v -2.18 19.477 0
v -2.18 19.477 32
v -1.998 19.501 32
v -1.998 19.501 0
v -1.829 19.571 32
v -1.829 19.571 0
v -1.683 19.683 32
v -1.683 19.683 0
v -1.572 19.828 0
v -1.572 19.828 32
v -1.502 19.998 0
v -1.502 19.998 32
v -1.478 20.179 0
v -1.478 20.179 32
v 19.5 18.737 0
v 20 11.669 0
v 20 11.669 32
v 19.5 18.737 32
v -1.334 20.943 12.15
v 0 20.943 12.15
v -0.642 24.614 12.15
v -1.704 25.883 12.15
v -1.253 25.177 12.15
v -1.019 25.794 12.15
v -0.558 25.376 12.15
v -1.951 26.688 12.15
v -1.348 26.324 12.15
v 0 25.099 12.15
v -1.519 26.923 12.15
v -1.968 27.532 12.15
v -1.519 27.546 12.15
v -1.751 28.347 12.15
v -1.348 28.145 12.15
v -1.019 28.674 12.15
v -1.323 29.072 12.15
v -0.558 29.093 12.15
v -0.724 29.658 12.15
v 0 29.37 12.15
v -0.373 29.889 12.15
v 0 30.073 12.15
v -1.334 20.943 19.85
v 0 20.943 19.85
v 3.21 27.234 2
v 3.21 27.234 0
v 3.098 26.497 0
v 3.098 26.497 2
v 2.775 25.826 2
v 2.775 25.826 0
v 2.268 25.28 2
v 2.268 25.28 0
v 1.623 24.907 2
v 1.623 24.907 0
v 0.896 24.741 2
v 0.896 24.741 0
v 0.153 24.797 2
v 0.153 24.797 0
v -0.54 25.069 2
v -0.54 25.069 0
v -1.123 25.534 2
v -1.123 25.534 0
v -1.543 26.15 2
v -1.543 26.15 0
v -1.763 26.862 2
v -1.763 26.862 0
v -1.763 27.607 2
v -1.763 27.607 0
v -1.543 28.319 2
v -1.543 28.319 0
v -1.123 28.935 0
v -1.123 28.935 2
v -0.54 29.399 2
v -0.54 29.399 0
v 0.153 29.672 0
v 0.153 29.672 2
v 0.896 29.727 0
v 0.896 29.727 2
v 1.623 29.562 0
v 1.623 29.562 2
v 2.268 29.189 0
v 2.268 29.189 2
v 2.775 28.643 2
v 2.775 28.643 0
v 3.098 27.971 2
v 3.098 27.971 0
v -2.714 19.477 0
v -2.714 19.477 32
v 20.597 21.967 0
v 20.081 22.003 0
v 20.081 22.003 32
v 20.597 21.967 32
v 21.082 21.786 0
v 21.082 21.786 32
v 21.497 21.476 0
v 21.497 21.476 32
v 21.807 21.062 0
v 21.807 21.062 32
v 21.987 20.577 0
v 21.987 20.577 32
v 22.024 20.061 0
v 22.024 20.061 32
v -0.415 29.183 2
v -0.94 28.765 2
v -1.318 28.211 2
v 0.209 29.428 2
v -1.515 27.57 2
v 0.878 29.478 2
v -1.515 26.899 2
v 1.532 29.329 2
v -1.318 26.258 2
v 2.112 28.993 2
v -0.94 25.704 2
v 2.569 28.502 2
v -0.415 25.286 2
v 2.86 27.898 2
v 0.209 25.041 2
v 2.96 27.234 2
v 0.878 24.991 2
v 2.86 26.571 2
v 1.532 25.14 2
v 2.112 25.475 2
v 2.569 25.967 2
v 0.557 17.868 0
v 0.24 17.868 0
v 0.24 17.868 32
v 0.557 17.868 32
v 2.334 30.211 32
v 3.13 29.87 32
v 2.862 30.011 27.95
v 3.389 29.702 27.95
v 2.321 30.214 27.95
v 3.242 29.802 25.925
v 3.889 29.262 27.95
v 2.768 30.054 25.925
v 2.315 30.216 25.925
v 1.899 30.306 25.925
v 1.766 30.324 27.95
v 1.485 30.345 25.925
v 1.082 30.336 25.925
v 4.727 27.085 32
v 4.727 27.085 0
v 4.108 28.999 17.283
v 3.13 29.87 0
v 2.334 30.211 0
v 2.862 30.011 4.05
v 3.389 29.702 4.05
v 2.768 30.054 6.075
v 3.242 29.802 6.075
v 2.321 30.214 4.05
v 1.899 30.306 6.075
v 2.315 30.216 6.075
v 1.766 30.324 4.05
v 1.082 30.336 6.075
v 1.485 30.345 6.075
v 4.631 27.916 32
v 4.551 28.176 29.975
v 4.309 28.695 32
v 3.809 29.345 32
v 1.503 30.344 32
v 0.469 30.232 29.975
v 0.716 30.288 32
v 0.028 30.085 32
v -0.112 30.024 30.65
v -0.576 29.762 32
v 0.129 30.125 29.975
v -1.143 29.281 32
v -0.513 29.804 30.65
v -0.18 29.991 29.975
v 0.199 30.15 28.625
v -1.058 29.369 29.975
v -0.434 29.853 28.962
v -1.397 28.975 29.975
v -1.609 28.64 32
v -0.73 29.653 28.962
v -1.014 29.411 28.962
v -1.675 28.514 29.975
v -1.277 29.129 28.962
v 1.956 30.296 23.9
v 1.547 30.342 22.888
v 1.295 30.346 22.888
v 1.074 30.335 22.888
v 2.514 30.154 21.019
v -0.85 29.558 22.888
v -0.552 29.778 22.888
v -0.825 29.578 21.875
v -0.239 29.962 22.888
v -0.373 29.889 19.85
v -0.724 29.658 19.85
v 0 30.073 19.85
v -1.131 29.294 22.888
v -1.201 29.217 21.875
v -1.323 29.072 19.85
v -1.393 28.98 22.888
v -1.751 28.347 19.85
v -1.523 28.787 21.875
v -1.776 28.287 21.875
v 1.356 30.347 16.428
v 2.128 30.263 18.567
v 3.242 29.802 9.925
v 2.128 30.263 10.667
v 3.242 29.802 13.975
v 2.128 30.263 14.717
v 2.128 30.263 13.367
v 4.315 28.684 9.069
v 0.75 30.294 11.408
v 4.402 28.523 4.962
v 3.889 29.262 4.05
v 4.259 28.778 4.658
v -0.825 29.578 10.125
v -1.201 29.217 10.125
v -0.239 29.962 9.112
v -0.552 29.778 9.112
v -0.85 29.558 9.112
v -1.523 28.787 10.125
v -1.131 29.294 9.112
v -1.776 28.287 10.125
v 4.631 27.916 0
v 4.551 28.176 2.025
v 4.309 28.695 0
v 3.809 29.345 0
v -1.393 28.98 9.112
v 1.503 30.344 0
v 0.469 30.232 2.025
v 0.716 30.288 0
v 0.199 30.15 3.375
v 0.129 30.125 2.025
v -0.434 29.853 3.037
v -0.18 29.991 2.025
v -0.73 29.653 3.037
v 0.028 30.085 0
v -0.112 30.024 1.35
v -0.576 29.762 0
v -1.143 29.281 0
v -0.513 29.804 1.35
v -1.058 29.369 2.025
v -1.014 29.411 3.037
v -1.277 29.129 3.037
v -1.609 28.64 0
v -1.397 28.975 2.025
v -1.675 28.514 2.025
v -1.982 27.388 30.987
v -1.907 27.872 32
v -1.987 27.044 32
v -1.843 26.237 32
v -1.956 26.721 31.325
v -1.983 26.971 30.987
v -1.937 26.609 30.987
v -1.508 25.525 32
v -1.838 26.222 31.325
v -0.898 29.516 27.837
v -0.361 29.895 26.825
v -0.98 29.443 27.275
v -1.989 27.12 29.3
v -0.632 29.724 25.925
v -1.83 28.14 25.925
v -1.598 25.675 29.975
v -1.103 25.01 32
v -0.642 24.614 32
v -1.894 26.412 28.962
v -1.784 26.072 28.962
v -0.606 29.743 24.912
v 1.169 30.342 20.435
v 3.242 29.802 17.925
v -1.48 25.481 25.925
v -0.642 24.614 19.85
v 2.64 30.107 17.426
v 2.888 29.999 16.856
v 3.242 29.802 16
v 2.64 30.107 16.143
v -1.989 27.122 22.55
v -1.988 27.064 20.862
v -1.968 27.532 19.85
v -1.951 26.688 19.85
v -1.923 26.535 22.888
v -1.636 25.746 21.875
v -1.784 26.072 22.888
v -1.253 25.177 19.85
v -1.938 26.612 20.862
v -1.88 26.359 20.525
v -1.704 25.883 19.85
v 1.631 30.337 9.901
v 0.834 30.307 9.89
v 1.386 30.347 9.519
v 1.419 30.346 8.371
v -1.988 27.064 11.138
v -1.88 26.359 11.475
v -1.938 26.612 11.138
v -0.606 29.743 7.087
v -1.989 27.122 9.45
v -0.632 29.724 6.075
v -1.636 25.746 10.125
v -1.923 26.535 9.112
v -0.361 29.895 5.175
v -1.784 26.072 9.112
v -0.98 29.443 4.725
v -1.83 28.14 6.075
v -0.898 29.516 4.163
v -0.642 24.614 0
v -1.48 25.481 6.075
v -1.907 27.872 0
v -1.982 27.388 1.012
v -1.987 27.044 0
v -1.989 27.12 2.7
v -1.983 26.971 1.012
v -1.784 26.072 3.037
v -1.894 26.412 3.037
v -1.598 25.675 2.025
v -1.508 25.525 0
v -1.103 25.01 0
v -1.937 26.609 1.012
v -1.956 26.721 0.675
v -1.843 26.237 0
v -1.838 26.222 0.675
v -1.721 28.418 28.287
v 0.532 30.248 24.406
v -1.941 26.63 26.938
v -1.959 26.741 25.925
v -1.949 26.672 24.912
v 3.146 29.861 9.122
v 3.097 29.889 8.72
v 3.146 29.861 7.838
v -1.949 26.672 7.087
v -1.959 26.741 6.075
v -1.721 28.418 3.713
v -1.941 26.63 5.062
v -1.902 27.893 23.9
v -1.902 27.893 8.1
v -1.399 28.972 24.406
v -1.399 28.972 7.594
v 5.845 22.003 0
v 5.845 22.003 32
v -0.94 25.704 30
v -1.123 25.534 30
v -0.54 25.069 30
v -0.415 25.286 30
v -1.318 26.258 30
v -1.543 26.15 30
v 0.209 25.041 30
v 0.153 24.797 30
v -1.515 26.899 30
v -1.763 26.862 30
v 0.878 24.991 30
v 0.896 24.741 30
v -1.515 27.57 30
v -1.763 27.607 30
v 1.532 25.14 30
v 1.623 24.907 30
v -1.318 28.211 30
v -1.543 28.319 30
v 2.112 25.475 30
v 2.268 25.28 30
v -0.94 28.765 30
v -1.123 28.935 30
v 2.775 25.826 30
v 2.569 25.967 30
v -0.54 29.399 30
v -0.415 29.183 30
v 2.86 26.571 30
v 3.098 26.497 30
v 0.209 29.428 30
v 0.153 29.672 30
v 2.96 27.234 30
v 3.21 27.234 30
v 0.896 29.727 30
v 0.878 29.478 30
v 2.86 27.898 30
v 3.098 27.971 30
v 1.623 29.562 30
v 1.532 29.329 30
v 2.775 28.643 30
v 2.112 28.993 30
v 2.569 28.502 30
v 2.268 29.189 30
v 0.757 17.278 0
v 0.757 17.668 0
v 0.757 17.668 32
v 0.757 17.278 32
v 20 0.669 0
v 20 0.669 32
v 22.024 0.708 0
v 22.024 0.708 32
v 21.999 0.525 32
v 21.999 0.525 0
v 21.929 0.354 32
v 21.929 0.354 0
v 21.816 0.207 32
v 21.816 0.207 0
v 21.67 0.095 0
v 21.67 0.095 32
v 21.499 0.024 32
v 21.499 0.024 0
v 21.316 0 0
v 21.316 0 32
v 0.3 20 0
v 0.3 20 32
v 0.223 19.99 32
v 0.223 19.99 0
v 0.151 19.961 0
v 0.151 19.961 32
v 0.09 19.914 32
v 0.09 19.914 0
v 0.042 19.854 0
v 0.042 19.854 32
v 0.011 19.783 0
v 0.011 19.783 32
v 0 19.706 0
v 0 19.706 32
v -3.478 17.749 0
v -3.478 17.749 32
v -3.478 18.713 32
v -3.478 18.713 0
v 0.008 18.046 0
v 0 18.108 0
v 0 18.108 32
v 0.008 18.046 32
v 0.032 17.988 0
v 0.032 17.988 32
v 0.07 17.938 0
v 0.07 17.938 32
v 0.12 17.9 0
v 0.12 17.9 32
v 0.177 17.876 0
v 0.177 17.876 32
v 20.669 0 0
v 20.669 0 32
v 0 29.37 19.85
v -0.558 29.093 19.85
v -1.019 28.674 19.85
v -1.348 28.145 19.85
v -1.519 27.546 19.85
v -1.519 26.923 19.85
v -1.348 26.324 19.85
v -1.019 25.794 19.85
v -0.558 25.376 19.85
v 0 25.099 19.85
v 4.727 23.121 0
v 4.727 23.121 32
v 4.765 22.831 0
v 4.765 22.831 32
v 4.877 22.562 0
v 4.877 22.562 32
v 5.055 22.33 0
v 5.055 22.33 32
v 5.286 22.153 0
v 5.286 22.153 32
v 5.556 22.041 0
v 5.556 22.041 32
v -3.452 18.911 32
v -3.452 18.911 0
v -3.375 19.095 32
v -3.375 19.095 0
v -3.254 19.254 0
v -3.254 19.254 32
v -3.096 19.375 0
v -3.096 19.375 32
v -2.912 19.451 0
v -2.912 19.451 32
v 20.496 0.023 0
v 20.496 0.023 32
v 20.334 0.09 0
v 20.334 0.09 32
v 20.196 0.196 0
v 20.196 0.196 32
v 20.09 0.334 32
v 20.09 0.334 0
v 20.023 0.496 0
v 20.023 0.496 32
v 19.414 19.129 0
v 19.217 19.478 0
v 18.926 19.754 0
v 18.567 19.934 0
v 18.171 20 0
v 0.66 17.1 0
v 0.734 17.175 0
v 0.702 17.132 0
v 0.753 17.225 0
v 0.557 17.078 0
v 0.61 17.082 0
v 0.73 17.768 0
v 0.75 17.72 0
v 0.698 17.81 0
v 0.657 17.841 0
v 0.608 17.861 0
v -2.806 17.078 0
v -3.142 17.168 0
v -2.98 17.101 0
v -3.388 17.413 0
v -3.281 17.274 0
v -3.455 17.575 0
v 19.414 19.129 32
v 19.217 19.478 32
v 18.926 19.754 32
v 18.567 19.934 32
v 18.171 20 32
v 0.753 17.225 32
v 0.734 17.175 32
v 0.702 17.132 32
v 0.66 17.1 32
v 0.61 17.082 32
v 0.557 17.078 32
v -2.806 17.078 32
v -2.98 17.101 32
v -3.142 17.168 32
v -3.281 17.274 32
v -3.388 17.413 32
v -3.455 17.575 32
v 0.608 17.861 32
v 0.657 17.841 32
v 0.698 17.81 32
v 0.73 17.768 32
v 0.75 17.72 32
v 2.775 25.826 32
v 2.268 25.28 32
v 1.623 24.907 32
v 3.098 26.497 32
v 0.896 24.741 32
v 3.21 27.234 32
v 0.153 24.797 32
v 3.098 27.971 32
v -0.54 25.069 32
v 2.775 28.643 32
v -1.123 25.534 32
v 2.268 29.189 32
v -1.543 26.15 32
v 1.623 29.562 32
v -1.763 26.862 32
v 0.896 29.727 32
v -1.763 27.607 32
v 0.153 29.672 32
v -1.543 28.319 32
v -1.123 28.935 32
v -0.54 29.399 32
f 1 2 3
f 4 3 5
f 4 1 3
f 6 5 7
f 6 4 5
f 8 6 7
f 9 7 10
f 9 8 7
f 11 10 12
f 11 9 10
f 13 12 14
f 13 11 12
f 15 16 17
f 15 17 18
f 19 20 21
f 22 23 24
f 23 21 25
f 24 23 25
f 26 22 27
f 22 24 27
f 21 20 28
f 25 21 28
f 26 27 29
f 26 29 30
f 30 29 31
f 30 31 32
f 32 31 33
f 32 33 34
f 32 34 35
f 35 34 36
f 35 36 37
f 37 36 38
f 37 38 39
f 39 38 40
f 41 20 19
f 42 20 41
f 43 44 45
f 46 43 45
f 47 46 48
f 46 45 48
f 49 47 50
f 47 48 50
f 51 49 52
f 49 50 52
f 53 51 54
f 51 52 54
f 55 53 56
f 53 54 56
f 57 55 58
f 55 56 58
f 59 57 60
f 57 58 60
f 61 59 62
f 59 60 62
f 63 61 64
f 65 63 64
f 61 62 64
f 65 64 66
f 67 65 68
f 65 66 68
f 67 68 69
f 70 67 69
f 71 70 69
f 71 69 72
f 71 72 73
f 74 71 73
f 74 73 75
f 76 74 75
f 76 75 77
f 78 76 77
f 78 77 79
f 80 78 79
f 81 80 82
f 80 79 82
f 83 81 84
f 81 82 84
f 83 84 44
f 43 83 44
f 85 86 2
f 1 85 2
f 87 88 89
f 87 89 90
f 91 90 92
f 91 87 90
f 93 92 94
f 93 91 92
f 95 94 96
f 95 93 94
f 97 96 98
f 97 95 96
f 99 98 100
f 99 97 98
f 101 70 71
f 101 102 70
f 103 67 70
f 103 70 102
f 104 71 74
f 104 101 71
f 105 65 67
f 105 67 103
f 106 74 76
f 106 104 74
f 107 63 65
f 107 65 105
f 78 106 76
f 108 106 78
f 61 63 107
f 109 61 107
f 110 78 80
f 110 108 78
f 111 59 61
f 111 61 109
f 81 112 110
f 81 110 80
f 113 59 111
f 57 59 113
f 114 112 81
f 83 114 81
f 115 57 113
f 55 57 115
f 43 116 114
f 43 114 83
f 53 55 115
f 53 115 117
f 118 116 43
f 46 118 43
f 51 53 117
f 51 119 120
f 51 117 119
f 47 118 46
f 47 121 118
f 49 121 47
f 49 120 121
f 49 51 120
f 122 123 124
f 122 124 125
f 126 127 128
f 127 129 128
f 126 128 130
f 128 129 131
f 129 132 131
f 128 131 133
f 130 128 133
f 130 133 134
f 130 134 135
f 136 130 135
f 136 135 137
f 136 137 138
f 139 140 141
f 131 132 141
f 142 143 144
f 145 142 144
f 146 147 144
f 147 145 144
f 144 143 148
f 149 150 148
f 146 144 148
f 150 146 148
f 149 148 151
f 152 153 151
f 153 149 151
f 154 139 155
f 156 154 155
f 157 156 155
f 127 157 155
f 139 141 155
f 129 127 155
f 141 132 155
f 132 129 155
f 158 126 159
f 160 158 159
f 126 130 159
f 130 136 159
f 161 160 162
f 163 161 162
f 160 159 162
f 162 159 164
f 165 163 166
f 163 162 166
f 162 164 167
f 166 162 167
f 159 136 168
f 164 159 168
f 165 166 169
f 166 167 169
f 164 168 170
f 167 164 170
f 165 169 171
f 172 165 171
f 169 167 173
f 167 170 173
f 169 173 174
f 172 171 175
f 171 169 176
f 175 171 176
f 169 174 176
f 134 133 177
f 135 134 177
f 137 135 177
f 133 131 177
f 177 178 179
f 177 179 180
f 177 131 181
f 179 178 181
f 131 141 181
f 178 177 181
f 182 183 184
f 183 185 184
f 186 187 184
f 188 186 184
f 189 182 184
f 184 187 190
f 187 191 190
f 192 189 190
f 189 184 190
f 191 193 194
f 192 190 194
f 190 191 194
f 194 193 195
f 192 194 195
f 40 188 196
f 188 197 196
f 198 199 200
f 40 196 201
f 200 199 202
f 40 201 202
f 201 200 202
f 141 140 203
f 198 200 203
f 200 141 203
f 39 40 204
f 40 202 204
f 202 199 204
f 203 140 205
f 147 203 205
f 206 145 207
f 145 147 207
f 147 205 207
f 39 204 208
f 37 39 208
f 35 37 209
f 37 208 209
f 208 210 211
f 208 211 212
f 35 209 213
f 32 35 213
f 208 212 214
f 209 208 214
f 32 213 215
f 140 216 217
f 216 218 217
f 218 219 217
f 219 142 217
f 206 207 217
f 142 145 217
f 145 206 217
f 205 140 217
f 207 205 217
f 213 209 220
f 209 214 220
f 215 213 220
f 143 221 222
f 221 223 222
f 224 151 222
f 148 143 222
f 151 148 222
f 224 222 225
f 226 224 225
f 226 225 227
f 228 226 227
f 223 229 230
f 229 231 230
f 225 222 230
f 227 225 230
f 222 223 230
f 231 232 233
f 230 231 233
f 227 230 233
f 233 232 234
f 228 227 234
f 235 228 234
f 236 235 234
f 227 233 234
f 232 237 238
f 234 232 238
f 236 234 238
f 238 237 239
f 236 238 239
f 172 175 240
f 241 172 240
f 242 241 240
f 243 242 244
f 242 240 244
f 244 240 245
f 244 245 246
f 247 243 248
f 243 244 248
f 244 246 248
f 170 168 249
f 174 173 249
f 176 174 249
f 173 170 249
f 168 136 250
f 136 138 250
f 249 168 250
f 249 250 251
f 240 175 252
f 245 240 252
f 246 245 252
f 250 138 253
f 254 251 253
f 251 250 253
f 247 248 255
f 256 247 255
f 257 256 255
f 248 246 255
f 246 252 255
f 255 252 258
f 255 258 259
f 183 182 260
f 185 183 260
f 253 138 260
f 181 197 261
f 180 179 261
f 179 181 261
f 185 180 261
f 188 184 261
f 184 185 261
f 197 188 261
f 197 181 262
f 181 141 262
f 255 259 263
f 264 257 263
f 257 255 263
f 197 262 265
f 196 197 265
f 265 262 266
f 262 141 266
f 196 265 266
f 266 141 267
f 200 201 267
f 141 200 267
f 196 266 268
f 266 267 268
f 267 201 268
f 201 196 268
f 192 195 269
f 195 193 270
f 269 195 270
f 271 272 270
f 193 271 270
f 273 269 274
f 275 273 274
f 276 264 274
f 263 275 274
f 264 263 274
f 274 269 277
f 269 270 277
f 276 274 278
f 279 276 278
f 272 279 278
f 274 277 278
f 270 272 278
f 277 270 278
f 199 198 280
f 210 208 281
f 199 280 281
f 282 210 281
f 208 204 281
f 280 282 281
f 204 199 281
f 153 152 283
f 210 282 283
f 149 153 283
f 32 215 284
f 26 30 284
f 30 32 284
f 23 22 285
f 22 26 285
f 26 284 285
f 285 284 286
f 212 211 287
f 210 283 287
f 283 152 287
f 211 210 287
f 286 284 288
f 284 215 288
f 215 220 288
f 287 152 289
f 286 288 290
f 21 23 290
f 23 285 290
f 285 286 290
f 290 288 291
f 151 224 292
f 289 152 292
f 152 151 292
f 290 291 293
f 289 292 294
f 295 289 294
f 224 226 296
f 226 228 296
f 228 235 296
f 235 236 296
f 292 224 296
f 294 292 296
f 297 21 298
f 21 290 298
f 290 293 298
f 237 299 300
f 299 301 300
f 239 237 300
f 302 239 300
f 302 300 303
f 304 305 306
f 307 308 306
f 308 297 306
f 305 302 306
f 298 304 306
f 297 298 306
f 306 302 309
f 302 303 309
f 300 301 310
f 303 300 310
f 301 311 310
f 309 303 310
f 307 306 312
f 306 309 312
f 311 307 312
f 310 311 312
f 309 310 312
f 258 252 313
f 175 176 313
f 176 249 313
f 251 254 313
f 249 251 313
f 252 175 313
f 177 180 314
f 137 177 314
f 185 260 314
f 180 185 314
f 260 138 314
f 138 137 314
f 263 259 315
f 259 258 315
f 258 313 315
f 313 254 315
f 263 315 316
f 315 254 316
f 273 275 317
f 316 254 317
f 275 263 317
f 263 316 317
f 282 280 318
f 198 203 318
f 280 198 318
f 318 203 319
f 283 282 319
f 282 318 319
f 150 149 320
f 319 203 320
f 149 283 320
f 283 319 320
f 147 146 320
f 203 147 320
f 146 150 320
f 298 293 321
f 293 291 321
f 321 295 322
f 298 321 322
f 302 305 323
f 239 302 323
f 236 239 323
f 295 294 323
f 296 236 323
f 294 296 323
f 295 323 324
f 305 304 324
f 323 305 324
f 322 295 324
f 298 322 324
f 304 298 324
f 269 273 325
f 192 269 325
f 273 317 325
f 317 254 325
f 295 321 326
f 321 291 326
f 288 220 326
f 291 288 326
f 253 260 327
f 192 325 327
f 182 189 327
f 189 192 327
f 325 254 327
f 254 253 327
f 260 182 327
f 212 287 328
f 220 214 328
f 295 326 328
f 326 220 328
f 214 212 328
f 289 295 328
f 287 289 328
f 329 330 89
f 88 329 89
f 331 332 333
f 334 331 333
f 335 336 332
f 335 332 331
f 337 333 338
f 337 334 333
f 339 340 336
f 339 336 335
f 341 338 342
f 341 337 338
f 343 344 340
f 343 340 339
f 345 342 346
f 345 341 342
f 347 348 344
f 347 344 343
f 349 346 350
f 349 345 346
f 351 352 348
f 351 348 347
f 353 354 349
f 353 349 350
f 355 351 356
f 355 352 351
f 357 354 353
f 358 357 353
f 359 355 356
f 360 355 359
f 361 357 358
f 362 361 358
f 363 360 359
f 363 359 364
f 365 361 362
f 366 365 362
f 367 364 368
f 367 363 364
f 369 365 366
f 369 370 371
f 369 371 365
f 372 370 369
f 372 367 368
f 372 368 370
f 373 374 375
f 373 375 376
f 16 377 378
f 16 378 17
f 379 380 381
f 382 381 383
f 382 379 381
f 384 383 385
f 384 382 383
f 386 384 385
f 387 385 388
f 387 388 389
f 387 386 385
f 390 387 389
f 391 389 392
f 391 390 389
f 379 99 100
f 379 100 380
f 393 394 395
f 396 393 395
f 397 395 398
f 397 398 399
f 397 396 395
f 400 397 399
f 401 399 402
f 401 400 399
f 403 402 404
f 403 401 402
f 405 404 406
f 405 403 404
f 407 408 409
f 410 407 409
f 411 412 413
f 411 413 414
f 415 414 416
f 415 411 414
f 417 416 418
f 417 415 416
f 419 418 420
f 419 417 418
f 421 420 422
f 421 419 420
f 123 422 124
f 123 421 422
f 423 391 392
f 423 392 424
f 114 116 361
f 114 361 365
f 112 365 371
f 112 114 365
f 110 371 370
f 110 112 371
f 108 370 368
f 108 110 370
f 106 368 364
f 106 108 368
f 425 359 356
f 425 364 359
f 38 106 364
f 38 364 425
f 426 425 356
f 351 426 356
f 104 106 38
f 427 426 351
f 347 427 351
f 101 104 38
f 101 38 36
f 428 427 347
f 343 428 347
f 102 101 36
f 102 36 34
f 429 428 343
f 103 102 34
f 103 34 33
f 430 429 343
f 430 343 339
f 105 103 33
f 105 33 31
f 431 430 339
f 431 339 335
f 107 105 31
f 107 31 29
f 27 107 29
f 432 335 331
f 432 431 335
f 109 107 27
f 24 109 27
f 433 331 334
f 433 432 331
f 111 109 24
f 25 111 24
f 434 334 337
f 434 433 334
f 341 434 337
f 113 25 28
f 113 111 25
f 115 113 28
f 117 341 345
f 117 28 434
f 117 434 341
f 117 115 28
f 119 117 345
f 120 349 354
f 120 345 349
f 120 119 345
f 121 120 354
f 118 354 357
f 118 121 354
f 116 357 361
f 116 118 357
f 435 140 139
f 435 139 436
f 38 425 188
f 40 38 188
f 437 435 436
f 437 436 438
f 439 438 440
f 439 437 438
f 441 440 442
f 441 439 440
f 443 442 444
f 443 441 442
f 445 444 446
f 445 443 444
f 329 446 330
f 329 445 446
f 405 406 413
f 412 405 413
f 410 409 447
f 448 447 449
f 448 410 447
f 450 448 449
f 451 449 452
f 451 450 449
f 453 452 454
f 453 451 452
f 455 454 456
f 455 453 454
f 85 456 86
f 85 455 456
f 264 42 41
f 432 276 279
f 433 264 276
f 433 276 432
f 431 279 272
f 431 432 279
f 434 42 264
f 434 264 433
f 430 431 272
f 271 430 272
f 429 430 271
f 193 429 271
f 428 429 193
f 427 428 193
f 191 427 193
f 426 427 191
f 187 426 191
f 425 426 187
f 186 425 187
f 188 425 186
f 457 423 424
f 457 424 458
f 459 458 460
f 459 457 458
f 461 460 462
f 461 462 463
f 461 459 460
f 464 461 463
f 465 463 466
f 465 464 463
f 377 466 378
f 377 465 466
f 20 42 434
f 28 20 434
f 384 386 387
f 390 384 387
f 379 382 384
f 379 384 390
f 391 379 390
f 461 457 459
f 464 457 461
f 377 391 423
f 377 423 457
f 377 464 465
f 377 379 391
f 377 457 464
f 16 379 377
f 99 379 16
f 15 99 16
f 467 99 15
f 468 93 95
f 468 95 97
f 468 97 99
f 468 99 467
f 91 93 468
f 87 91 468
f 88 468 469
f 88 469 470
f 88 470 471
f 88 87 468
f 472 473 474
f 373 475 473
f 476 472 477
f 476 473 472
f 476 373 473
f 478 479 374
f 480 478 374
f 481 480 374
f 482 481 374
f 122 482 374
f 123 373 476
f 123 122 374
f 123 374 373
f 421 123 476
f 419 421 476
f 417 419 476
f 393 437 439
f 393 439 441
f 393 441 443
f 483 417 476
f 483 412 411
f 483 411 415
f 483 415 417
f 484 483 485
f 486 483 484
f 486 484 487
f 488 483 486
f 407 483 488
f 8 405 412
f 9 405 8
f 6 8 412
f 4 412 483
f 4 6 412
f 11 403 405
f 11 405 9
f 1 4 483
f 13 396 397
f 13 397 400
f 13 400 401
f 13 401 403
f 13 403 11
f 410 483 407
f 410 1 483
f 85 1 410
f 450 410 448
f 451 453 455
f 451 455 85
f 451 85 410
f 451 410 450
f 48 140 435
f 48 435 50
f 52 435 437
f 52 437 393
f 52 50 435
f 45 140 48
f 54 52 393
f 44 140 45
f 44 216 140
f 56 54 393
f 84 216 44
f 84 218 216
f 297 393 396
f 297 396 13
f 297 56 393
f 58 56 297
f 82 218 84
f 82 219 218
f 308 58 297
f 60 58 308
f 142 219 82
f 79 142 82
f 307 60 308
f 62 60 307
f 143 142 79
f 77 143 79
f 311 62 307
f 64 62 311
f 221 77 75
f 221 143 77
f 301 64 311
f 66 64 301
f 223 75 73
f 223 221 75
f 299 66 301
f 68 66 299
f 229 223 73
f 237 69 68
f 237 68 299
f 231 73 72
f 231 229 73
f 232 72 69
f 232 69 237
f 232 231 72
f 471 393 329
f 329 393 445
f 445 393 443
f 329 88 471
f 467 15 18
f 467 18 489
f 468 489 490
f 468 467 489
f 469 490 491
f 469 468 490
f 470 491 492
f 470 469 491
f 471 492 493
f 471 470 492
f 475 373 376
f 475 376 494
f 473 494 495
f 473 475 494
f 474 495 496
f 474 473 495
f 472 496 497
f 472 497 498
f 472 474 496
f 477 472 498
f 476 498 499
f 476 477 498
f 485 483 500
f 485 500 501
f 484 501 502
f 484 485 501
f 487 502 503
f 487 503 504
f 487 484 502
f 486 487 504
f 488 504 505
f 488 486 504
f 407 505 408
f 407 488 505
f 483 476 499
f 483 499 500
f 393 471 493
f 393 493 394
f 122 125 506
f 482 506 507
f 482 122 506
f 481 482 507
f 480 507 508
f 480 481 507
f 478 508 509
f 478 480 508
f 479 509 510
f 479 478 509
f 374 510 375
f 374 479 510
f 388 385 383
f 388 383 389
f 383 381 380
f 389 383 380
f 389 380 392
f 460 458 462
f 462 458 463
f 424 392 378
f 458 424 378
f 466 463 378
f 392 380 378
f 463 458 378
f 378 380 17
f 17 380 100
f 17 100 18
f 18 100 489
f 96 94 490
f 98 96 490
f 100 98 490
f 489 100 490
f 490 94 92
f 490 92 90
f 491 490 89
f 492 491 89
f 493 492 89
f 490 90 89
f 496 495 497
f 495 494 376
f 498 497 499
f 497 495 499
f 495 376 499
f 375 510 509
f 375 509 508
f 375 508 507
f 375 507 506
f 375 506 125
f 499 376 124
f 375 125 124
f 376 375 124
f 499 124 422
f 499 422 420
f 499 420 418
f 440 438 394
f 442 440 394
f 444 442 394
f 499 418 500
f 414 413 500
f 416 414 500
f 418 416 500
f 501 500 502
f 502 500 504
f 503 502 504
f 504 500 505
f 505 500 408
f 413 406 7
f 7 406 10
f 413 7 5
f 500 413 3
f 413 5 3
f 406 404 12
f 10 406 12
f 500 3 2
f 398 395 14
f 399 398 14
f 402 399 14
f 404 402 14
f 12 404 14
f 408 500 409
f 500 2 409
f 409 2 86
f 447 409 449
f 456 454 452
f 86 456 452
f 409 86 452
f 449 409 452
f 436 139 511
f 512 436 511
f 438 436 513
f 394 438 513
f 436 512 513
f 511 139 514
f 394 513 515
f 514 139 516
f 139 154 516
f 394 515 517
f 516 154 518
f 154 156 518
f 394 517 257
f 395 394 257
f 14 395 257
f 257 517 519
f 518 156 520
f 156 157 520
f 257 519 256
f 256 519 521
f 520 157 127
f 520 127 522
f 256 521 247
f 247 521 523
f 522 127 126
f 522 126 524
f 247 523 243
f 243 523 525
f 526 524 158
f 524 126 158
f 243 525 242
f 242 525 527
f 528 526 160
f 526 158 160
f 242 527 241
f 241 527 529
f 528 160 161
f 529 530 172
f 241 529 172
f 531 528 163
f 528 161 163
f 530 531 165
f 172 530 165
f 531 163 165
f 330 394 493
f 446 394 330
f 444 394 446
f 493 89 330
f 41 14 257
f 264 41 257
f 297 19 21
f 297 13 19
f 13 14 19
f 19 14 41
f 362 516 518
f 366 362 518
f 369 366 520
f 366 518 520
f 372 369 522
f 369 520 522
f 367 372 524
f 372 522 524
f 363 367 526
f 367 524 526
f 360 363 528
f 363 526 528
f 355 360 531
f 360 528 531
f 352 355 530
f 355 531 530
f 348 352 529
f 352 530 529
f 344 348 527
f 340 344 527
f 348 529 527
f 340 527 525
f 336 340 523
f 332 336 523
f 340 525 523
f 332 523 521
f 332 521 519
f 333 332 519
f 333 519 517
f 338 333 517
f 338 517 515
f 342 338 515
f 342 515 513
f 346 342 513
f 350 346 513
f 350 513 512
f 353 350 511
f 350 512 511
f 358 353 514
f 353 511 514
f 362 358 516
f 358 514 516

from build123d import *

# Parameters (mm, degrees)
SKETCH_R        = 2.25
PAD_DEPTH       = 32
SKETCH005_W     = 9.375375
SKETCH005_H     = 7.7
POCKET003_DEPTH = 9
SKETCH006_R     = 2.5
POCKET_DEPTH    = 2
SKETCH007_R     = 2.5
POCKET004_DEPTH = 2


with BuildPart() as part:
    # Sketch → Pad (new body)
    with BuildSketch(Plane.XY):
        with BuildLine():
            Line((21.315765, -4.2e-05), (20.668644, -4.2e-05))
            ThreePointArc((20.668644, -4.2e-05), (20.195841, 0.195799), (20, 0.668602))
            Line((20, 0.668602), (20, 11.66923))
            Line((20, 11.66923), (19.499999, 18.736793))
            ThreePointArc((19.499999, 18.736793), (19.081426, 19.626884), (18.171344, 20))
            Line((18.171344, 20), (0.299523, 20))
            ThreePointArc((0.299523, 20), (0.089647, 19.914364), (-0.00041, 19.706346))
            Line((-0.00041, 19.706346), (-0.00041, 18.108035))
            ThreePointArc((-0.00041, 18.108035), (0.06988, 17.93834), (0.239575, 17.86805))
            Line((0.239575, 17.86805), (0.556635, 17.86805))
            ThreePointArc((0.556635, 17.86805), (0.698252, 17.809668), (0.756635, 17.66805))
            Line((0.756635, 17.66805), (0.756635, 17.277753))
            ThreePointArc((0.756635, 17.277753), (0.702338, 17.132051), (0.556635, 17.077754))
            Line((0.556635, 17.077754), (-2.806351, 17.077754))
            ThreePointArc((-2.806351, 17.077754), (-3.281134, 17.274416), (-3.477796, 17.749199))
            Line((-3.477796, 17.749199), (-3.477796, 18.713266))
            ThreePointArc((-3.477796, 18.713266), (-3.254024, 19.253501), (-2.713789, 19.477273))
            Line((-2.713789, 19.477273), (-2.17988, 19.477273))
            ThreePointArc((-2.17988, 19.477273), (-1.683432, 19.682909), (-1.477796, 20.179357))
            Line((-1.477796, 20.179357), (-0.641937, 24.61424))
            add(Edge.make_bspline(
                [(4.72723, 27.084848), (4.845872, 32.305125), (-0.102828, 30.027993), (-5.051528, 27.750862), (-0.641937, 24.61424)],
                knots=[3.141593, 3.141593, 3.141593, 5.18759, 5.18759, 7.233588, 7.233588, 7.233588], degree=2, weights=[1, 0.520808, 1, 0.520808, 1]))
            Line((4.72723, 27.084848), (4.72723, 23.120815))
            ThreePointArc((4.72723, 23.120815), (5.054887, 22.330429), (5.845399, 22.003078))
            Line((5.845399, 22.003078), (20.081244, 22.003078))
            ThreePointArc((20.081244, 22.003078), (21.496678, 21.47621), (22.023546, 20.060776))
            Line((22.023546, 20.060776), (22.023546, 0.707739))
            ThreePointArc((22.023546, 0.707739), (21.816242, 0.207263), (21.315765, -4.2e-05))
        make_face()
        with Locations((0.70955, 27.234343)):
            Circle(SKETCH_R, mode=Mode.SUBTRACT)
    extrude(amount=PAD_DEPTH)

    # Sketch005 → Pocket003 (cut)
    with BuildSketch(Plane.YZ):
        with Locations((25.630559, 16)):
            Rectangle(SKETCH005_W, SKETCH005_H)
    extrude(amount=-POCKET003_DEPTH, mode=Mode.SUBTRACT)

    # Sketch006 (on Face5 of Pocket003) → Pocket (cut)
    with BuildSketch(Plane.XY.offset(32)):
        with Locations((0.70955, 27.234343)):
            Circle(SKETCH006_R)
    extrude(amount=-POCKET_DEPTH, mode=Mode.SUBTRACT)

    # Sketch007 (on Face4 of Pocket003) → Pocket004 (cut)
    with BuildSketch(Plane(origin=(0, 0, 0), x_dir=(1, 0, 0), z_dir=(0, 0, -1))):
        with Locations((0.70955, -27.234343)):
            Circle(SKETCH007_R)
    extrude(amount=-POCKET004_DEPTH, mode=Mode.SUBTRACT)


solid = part.part
